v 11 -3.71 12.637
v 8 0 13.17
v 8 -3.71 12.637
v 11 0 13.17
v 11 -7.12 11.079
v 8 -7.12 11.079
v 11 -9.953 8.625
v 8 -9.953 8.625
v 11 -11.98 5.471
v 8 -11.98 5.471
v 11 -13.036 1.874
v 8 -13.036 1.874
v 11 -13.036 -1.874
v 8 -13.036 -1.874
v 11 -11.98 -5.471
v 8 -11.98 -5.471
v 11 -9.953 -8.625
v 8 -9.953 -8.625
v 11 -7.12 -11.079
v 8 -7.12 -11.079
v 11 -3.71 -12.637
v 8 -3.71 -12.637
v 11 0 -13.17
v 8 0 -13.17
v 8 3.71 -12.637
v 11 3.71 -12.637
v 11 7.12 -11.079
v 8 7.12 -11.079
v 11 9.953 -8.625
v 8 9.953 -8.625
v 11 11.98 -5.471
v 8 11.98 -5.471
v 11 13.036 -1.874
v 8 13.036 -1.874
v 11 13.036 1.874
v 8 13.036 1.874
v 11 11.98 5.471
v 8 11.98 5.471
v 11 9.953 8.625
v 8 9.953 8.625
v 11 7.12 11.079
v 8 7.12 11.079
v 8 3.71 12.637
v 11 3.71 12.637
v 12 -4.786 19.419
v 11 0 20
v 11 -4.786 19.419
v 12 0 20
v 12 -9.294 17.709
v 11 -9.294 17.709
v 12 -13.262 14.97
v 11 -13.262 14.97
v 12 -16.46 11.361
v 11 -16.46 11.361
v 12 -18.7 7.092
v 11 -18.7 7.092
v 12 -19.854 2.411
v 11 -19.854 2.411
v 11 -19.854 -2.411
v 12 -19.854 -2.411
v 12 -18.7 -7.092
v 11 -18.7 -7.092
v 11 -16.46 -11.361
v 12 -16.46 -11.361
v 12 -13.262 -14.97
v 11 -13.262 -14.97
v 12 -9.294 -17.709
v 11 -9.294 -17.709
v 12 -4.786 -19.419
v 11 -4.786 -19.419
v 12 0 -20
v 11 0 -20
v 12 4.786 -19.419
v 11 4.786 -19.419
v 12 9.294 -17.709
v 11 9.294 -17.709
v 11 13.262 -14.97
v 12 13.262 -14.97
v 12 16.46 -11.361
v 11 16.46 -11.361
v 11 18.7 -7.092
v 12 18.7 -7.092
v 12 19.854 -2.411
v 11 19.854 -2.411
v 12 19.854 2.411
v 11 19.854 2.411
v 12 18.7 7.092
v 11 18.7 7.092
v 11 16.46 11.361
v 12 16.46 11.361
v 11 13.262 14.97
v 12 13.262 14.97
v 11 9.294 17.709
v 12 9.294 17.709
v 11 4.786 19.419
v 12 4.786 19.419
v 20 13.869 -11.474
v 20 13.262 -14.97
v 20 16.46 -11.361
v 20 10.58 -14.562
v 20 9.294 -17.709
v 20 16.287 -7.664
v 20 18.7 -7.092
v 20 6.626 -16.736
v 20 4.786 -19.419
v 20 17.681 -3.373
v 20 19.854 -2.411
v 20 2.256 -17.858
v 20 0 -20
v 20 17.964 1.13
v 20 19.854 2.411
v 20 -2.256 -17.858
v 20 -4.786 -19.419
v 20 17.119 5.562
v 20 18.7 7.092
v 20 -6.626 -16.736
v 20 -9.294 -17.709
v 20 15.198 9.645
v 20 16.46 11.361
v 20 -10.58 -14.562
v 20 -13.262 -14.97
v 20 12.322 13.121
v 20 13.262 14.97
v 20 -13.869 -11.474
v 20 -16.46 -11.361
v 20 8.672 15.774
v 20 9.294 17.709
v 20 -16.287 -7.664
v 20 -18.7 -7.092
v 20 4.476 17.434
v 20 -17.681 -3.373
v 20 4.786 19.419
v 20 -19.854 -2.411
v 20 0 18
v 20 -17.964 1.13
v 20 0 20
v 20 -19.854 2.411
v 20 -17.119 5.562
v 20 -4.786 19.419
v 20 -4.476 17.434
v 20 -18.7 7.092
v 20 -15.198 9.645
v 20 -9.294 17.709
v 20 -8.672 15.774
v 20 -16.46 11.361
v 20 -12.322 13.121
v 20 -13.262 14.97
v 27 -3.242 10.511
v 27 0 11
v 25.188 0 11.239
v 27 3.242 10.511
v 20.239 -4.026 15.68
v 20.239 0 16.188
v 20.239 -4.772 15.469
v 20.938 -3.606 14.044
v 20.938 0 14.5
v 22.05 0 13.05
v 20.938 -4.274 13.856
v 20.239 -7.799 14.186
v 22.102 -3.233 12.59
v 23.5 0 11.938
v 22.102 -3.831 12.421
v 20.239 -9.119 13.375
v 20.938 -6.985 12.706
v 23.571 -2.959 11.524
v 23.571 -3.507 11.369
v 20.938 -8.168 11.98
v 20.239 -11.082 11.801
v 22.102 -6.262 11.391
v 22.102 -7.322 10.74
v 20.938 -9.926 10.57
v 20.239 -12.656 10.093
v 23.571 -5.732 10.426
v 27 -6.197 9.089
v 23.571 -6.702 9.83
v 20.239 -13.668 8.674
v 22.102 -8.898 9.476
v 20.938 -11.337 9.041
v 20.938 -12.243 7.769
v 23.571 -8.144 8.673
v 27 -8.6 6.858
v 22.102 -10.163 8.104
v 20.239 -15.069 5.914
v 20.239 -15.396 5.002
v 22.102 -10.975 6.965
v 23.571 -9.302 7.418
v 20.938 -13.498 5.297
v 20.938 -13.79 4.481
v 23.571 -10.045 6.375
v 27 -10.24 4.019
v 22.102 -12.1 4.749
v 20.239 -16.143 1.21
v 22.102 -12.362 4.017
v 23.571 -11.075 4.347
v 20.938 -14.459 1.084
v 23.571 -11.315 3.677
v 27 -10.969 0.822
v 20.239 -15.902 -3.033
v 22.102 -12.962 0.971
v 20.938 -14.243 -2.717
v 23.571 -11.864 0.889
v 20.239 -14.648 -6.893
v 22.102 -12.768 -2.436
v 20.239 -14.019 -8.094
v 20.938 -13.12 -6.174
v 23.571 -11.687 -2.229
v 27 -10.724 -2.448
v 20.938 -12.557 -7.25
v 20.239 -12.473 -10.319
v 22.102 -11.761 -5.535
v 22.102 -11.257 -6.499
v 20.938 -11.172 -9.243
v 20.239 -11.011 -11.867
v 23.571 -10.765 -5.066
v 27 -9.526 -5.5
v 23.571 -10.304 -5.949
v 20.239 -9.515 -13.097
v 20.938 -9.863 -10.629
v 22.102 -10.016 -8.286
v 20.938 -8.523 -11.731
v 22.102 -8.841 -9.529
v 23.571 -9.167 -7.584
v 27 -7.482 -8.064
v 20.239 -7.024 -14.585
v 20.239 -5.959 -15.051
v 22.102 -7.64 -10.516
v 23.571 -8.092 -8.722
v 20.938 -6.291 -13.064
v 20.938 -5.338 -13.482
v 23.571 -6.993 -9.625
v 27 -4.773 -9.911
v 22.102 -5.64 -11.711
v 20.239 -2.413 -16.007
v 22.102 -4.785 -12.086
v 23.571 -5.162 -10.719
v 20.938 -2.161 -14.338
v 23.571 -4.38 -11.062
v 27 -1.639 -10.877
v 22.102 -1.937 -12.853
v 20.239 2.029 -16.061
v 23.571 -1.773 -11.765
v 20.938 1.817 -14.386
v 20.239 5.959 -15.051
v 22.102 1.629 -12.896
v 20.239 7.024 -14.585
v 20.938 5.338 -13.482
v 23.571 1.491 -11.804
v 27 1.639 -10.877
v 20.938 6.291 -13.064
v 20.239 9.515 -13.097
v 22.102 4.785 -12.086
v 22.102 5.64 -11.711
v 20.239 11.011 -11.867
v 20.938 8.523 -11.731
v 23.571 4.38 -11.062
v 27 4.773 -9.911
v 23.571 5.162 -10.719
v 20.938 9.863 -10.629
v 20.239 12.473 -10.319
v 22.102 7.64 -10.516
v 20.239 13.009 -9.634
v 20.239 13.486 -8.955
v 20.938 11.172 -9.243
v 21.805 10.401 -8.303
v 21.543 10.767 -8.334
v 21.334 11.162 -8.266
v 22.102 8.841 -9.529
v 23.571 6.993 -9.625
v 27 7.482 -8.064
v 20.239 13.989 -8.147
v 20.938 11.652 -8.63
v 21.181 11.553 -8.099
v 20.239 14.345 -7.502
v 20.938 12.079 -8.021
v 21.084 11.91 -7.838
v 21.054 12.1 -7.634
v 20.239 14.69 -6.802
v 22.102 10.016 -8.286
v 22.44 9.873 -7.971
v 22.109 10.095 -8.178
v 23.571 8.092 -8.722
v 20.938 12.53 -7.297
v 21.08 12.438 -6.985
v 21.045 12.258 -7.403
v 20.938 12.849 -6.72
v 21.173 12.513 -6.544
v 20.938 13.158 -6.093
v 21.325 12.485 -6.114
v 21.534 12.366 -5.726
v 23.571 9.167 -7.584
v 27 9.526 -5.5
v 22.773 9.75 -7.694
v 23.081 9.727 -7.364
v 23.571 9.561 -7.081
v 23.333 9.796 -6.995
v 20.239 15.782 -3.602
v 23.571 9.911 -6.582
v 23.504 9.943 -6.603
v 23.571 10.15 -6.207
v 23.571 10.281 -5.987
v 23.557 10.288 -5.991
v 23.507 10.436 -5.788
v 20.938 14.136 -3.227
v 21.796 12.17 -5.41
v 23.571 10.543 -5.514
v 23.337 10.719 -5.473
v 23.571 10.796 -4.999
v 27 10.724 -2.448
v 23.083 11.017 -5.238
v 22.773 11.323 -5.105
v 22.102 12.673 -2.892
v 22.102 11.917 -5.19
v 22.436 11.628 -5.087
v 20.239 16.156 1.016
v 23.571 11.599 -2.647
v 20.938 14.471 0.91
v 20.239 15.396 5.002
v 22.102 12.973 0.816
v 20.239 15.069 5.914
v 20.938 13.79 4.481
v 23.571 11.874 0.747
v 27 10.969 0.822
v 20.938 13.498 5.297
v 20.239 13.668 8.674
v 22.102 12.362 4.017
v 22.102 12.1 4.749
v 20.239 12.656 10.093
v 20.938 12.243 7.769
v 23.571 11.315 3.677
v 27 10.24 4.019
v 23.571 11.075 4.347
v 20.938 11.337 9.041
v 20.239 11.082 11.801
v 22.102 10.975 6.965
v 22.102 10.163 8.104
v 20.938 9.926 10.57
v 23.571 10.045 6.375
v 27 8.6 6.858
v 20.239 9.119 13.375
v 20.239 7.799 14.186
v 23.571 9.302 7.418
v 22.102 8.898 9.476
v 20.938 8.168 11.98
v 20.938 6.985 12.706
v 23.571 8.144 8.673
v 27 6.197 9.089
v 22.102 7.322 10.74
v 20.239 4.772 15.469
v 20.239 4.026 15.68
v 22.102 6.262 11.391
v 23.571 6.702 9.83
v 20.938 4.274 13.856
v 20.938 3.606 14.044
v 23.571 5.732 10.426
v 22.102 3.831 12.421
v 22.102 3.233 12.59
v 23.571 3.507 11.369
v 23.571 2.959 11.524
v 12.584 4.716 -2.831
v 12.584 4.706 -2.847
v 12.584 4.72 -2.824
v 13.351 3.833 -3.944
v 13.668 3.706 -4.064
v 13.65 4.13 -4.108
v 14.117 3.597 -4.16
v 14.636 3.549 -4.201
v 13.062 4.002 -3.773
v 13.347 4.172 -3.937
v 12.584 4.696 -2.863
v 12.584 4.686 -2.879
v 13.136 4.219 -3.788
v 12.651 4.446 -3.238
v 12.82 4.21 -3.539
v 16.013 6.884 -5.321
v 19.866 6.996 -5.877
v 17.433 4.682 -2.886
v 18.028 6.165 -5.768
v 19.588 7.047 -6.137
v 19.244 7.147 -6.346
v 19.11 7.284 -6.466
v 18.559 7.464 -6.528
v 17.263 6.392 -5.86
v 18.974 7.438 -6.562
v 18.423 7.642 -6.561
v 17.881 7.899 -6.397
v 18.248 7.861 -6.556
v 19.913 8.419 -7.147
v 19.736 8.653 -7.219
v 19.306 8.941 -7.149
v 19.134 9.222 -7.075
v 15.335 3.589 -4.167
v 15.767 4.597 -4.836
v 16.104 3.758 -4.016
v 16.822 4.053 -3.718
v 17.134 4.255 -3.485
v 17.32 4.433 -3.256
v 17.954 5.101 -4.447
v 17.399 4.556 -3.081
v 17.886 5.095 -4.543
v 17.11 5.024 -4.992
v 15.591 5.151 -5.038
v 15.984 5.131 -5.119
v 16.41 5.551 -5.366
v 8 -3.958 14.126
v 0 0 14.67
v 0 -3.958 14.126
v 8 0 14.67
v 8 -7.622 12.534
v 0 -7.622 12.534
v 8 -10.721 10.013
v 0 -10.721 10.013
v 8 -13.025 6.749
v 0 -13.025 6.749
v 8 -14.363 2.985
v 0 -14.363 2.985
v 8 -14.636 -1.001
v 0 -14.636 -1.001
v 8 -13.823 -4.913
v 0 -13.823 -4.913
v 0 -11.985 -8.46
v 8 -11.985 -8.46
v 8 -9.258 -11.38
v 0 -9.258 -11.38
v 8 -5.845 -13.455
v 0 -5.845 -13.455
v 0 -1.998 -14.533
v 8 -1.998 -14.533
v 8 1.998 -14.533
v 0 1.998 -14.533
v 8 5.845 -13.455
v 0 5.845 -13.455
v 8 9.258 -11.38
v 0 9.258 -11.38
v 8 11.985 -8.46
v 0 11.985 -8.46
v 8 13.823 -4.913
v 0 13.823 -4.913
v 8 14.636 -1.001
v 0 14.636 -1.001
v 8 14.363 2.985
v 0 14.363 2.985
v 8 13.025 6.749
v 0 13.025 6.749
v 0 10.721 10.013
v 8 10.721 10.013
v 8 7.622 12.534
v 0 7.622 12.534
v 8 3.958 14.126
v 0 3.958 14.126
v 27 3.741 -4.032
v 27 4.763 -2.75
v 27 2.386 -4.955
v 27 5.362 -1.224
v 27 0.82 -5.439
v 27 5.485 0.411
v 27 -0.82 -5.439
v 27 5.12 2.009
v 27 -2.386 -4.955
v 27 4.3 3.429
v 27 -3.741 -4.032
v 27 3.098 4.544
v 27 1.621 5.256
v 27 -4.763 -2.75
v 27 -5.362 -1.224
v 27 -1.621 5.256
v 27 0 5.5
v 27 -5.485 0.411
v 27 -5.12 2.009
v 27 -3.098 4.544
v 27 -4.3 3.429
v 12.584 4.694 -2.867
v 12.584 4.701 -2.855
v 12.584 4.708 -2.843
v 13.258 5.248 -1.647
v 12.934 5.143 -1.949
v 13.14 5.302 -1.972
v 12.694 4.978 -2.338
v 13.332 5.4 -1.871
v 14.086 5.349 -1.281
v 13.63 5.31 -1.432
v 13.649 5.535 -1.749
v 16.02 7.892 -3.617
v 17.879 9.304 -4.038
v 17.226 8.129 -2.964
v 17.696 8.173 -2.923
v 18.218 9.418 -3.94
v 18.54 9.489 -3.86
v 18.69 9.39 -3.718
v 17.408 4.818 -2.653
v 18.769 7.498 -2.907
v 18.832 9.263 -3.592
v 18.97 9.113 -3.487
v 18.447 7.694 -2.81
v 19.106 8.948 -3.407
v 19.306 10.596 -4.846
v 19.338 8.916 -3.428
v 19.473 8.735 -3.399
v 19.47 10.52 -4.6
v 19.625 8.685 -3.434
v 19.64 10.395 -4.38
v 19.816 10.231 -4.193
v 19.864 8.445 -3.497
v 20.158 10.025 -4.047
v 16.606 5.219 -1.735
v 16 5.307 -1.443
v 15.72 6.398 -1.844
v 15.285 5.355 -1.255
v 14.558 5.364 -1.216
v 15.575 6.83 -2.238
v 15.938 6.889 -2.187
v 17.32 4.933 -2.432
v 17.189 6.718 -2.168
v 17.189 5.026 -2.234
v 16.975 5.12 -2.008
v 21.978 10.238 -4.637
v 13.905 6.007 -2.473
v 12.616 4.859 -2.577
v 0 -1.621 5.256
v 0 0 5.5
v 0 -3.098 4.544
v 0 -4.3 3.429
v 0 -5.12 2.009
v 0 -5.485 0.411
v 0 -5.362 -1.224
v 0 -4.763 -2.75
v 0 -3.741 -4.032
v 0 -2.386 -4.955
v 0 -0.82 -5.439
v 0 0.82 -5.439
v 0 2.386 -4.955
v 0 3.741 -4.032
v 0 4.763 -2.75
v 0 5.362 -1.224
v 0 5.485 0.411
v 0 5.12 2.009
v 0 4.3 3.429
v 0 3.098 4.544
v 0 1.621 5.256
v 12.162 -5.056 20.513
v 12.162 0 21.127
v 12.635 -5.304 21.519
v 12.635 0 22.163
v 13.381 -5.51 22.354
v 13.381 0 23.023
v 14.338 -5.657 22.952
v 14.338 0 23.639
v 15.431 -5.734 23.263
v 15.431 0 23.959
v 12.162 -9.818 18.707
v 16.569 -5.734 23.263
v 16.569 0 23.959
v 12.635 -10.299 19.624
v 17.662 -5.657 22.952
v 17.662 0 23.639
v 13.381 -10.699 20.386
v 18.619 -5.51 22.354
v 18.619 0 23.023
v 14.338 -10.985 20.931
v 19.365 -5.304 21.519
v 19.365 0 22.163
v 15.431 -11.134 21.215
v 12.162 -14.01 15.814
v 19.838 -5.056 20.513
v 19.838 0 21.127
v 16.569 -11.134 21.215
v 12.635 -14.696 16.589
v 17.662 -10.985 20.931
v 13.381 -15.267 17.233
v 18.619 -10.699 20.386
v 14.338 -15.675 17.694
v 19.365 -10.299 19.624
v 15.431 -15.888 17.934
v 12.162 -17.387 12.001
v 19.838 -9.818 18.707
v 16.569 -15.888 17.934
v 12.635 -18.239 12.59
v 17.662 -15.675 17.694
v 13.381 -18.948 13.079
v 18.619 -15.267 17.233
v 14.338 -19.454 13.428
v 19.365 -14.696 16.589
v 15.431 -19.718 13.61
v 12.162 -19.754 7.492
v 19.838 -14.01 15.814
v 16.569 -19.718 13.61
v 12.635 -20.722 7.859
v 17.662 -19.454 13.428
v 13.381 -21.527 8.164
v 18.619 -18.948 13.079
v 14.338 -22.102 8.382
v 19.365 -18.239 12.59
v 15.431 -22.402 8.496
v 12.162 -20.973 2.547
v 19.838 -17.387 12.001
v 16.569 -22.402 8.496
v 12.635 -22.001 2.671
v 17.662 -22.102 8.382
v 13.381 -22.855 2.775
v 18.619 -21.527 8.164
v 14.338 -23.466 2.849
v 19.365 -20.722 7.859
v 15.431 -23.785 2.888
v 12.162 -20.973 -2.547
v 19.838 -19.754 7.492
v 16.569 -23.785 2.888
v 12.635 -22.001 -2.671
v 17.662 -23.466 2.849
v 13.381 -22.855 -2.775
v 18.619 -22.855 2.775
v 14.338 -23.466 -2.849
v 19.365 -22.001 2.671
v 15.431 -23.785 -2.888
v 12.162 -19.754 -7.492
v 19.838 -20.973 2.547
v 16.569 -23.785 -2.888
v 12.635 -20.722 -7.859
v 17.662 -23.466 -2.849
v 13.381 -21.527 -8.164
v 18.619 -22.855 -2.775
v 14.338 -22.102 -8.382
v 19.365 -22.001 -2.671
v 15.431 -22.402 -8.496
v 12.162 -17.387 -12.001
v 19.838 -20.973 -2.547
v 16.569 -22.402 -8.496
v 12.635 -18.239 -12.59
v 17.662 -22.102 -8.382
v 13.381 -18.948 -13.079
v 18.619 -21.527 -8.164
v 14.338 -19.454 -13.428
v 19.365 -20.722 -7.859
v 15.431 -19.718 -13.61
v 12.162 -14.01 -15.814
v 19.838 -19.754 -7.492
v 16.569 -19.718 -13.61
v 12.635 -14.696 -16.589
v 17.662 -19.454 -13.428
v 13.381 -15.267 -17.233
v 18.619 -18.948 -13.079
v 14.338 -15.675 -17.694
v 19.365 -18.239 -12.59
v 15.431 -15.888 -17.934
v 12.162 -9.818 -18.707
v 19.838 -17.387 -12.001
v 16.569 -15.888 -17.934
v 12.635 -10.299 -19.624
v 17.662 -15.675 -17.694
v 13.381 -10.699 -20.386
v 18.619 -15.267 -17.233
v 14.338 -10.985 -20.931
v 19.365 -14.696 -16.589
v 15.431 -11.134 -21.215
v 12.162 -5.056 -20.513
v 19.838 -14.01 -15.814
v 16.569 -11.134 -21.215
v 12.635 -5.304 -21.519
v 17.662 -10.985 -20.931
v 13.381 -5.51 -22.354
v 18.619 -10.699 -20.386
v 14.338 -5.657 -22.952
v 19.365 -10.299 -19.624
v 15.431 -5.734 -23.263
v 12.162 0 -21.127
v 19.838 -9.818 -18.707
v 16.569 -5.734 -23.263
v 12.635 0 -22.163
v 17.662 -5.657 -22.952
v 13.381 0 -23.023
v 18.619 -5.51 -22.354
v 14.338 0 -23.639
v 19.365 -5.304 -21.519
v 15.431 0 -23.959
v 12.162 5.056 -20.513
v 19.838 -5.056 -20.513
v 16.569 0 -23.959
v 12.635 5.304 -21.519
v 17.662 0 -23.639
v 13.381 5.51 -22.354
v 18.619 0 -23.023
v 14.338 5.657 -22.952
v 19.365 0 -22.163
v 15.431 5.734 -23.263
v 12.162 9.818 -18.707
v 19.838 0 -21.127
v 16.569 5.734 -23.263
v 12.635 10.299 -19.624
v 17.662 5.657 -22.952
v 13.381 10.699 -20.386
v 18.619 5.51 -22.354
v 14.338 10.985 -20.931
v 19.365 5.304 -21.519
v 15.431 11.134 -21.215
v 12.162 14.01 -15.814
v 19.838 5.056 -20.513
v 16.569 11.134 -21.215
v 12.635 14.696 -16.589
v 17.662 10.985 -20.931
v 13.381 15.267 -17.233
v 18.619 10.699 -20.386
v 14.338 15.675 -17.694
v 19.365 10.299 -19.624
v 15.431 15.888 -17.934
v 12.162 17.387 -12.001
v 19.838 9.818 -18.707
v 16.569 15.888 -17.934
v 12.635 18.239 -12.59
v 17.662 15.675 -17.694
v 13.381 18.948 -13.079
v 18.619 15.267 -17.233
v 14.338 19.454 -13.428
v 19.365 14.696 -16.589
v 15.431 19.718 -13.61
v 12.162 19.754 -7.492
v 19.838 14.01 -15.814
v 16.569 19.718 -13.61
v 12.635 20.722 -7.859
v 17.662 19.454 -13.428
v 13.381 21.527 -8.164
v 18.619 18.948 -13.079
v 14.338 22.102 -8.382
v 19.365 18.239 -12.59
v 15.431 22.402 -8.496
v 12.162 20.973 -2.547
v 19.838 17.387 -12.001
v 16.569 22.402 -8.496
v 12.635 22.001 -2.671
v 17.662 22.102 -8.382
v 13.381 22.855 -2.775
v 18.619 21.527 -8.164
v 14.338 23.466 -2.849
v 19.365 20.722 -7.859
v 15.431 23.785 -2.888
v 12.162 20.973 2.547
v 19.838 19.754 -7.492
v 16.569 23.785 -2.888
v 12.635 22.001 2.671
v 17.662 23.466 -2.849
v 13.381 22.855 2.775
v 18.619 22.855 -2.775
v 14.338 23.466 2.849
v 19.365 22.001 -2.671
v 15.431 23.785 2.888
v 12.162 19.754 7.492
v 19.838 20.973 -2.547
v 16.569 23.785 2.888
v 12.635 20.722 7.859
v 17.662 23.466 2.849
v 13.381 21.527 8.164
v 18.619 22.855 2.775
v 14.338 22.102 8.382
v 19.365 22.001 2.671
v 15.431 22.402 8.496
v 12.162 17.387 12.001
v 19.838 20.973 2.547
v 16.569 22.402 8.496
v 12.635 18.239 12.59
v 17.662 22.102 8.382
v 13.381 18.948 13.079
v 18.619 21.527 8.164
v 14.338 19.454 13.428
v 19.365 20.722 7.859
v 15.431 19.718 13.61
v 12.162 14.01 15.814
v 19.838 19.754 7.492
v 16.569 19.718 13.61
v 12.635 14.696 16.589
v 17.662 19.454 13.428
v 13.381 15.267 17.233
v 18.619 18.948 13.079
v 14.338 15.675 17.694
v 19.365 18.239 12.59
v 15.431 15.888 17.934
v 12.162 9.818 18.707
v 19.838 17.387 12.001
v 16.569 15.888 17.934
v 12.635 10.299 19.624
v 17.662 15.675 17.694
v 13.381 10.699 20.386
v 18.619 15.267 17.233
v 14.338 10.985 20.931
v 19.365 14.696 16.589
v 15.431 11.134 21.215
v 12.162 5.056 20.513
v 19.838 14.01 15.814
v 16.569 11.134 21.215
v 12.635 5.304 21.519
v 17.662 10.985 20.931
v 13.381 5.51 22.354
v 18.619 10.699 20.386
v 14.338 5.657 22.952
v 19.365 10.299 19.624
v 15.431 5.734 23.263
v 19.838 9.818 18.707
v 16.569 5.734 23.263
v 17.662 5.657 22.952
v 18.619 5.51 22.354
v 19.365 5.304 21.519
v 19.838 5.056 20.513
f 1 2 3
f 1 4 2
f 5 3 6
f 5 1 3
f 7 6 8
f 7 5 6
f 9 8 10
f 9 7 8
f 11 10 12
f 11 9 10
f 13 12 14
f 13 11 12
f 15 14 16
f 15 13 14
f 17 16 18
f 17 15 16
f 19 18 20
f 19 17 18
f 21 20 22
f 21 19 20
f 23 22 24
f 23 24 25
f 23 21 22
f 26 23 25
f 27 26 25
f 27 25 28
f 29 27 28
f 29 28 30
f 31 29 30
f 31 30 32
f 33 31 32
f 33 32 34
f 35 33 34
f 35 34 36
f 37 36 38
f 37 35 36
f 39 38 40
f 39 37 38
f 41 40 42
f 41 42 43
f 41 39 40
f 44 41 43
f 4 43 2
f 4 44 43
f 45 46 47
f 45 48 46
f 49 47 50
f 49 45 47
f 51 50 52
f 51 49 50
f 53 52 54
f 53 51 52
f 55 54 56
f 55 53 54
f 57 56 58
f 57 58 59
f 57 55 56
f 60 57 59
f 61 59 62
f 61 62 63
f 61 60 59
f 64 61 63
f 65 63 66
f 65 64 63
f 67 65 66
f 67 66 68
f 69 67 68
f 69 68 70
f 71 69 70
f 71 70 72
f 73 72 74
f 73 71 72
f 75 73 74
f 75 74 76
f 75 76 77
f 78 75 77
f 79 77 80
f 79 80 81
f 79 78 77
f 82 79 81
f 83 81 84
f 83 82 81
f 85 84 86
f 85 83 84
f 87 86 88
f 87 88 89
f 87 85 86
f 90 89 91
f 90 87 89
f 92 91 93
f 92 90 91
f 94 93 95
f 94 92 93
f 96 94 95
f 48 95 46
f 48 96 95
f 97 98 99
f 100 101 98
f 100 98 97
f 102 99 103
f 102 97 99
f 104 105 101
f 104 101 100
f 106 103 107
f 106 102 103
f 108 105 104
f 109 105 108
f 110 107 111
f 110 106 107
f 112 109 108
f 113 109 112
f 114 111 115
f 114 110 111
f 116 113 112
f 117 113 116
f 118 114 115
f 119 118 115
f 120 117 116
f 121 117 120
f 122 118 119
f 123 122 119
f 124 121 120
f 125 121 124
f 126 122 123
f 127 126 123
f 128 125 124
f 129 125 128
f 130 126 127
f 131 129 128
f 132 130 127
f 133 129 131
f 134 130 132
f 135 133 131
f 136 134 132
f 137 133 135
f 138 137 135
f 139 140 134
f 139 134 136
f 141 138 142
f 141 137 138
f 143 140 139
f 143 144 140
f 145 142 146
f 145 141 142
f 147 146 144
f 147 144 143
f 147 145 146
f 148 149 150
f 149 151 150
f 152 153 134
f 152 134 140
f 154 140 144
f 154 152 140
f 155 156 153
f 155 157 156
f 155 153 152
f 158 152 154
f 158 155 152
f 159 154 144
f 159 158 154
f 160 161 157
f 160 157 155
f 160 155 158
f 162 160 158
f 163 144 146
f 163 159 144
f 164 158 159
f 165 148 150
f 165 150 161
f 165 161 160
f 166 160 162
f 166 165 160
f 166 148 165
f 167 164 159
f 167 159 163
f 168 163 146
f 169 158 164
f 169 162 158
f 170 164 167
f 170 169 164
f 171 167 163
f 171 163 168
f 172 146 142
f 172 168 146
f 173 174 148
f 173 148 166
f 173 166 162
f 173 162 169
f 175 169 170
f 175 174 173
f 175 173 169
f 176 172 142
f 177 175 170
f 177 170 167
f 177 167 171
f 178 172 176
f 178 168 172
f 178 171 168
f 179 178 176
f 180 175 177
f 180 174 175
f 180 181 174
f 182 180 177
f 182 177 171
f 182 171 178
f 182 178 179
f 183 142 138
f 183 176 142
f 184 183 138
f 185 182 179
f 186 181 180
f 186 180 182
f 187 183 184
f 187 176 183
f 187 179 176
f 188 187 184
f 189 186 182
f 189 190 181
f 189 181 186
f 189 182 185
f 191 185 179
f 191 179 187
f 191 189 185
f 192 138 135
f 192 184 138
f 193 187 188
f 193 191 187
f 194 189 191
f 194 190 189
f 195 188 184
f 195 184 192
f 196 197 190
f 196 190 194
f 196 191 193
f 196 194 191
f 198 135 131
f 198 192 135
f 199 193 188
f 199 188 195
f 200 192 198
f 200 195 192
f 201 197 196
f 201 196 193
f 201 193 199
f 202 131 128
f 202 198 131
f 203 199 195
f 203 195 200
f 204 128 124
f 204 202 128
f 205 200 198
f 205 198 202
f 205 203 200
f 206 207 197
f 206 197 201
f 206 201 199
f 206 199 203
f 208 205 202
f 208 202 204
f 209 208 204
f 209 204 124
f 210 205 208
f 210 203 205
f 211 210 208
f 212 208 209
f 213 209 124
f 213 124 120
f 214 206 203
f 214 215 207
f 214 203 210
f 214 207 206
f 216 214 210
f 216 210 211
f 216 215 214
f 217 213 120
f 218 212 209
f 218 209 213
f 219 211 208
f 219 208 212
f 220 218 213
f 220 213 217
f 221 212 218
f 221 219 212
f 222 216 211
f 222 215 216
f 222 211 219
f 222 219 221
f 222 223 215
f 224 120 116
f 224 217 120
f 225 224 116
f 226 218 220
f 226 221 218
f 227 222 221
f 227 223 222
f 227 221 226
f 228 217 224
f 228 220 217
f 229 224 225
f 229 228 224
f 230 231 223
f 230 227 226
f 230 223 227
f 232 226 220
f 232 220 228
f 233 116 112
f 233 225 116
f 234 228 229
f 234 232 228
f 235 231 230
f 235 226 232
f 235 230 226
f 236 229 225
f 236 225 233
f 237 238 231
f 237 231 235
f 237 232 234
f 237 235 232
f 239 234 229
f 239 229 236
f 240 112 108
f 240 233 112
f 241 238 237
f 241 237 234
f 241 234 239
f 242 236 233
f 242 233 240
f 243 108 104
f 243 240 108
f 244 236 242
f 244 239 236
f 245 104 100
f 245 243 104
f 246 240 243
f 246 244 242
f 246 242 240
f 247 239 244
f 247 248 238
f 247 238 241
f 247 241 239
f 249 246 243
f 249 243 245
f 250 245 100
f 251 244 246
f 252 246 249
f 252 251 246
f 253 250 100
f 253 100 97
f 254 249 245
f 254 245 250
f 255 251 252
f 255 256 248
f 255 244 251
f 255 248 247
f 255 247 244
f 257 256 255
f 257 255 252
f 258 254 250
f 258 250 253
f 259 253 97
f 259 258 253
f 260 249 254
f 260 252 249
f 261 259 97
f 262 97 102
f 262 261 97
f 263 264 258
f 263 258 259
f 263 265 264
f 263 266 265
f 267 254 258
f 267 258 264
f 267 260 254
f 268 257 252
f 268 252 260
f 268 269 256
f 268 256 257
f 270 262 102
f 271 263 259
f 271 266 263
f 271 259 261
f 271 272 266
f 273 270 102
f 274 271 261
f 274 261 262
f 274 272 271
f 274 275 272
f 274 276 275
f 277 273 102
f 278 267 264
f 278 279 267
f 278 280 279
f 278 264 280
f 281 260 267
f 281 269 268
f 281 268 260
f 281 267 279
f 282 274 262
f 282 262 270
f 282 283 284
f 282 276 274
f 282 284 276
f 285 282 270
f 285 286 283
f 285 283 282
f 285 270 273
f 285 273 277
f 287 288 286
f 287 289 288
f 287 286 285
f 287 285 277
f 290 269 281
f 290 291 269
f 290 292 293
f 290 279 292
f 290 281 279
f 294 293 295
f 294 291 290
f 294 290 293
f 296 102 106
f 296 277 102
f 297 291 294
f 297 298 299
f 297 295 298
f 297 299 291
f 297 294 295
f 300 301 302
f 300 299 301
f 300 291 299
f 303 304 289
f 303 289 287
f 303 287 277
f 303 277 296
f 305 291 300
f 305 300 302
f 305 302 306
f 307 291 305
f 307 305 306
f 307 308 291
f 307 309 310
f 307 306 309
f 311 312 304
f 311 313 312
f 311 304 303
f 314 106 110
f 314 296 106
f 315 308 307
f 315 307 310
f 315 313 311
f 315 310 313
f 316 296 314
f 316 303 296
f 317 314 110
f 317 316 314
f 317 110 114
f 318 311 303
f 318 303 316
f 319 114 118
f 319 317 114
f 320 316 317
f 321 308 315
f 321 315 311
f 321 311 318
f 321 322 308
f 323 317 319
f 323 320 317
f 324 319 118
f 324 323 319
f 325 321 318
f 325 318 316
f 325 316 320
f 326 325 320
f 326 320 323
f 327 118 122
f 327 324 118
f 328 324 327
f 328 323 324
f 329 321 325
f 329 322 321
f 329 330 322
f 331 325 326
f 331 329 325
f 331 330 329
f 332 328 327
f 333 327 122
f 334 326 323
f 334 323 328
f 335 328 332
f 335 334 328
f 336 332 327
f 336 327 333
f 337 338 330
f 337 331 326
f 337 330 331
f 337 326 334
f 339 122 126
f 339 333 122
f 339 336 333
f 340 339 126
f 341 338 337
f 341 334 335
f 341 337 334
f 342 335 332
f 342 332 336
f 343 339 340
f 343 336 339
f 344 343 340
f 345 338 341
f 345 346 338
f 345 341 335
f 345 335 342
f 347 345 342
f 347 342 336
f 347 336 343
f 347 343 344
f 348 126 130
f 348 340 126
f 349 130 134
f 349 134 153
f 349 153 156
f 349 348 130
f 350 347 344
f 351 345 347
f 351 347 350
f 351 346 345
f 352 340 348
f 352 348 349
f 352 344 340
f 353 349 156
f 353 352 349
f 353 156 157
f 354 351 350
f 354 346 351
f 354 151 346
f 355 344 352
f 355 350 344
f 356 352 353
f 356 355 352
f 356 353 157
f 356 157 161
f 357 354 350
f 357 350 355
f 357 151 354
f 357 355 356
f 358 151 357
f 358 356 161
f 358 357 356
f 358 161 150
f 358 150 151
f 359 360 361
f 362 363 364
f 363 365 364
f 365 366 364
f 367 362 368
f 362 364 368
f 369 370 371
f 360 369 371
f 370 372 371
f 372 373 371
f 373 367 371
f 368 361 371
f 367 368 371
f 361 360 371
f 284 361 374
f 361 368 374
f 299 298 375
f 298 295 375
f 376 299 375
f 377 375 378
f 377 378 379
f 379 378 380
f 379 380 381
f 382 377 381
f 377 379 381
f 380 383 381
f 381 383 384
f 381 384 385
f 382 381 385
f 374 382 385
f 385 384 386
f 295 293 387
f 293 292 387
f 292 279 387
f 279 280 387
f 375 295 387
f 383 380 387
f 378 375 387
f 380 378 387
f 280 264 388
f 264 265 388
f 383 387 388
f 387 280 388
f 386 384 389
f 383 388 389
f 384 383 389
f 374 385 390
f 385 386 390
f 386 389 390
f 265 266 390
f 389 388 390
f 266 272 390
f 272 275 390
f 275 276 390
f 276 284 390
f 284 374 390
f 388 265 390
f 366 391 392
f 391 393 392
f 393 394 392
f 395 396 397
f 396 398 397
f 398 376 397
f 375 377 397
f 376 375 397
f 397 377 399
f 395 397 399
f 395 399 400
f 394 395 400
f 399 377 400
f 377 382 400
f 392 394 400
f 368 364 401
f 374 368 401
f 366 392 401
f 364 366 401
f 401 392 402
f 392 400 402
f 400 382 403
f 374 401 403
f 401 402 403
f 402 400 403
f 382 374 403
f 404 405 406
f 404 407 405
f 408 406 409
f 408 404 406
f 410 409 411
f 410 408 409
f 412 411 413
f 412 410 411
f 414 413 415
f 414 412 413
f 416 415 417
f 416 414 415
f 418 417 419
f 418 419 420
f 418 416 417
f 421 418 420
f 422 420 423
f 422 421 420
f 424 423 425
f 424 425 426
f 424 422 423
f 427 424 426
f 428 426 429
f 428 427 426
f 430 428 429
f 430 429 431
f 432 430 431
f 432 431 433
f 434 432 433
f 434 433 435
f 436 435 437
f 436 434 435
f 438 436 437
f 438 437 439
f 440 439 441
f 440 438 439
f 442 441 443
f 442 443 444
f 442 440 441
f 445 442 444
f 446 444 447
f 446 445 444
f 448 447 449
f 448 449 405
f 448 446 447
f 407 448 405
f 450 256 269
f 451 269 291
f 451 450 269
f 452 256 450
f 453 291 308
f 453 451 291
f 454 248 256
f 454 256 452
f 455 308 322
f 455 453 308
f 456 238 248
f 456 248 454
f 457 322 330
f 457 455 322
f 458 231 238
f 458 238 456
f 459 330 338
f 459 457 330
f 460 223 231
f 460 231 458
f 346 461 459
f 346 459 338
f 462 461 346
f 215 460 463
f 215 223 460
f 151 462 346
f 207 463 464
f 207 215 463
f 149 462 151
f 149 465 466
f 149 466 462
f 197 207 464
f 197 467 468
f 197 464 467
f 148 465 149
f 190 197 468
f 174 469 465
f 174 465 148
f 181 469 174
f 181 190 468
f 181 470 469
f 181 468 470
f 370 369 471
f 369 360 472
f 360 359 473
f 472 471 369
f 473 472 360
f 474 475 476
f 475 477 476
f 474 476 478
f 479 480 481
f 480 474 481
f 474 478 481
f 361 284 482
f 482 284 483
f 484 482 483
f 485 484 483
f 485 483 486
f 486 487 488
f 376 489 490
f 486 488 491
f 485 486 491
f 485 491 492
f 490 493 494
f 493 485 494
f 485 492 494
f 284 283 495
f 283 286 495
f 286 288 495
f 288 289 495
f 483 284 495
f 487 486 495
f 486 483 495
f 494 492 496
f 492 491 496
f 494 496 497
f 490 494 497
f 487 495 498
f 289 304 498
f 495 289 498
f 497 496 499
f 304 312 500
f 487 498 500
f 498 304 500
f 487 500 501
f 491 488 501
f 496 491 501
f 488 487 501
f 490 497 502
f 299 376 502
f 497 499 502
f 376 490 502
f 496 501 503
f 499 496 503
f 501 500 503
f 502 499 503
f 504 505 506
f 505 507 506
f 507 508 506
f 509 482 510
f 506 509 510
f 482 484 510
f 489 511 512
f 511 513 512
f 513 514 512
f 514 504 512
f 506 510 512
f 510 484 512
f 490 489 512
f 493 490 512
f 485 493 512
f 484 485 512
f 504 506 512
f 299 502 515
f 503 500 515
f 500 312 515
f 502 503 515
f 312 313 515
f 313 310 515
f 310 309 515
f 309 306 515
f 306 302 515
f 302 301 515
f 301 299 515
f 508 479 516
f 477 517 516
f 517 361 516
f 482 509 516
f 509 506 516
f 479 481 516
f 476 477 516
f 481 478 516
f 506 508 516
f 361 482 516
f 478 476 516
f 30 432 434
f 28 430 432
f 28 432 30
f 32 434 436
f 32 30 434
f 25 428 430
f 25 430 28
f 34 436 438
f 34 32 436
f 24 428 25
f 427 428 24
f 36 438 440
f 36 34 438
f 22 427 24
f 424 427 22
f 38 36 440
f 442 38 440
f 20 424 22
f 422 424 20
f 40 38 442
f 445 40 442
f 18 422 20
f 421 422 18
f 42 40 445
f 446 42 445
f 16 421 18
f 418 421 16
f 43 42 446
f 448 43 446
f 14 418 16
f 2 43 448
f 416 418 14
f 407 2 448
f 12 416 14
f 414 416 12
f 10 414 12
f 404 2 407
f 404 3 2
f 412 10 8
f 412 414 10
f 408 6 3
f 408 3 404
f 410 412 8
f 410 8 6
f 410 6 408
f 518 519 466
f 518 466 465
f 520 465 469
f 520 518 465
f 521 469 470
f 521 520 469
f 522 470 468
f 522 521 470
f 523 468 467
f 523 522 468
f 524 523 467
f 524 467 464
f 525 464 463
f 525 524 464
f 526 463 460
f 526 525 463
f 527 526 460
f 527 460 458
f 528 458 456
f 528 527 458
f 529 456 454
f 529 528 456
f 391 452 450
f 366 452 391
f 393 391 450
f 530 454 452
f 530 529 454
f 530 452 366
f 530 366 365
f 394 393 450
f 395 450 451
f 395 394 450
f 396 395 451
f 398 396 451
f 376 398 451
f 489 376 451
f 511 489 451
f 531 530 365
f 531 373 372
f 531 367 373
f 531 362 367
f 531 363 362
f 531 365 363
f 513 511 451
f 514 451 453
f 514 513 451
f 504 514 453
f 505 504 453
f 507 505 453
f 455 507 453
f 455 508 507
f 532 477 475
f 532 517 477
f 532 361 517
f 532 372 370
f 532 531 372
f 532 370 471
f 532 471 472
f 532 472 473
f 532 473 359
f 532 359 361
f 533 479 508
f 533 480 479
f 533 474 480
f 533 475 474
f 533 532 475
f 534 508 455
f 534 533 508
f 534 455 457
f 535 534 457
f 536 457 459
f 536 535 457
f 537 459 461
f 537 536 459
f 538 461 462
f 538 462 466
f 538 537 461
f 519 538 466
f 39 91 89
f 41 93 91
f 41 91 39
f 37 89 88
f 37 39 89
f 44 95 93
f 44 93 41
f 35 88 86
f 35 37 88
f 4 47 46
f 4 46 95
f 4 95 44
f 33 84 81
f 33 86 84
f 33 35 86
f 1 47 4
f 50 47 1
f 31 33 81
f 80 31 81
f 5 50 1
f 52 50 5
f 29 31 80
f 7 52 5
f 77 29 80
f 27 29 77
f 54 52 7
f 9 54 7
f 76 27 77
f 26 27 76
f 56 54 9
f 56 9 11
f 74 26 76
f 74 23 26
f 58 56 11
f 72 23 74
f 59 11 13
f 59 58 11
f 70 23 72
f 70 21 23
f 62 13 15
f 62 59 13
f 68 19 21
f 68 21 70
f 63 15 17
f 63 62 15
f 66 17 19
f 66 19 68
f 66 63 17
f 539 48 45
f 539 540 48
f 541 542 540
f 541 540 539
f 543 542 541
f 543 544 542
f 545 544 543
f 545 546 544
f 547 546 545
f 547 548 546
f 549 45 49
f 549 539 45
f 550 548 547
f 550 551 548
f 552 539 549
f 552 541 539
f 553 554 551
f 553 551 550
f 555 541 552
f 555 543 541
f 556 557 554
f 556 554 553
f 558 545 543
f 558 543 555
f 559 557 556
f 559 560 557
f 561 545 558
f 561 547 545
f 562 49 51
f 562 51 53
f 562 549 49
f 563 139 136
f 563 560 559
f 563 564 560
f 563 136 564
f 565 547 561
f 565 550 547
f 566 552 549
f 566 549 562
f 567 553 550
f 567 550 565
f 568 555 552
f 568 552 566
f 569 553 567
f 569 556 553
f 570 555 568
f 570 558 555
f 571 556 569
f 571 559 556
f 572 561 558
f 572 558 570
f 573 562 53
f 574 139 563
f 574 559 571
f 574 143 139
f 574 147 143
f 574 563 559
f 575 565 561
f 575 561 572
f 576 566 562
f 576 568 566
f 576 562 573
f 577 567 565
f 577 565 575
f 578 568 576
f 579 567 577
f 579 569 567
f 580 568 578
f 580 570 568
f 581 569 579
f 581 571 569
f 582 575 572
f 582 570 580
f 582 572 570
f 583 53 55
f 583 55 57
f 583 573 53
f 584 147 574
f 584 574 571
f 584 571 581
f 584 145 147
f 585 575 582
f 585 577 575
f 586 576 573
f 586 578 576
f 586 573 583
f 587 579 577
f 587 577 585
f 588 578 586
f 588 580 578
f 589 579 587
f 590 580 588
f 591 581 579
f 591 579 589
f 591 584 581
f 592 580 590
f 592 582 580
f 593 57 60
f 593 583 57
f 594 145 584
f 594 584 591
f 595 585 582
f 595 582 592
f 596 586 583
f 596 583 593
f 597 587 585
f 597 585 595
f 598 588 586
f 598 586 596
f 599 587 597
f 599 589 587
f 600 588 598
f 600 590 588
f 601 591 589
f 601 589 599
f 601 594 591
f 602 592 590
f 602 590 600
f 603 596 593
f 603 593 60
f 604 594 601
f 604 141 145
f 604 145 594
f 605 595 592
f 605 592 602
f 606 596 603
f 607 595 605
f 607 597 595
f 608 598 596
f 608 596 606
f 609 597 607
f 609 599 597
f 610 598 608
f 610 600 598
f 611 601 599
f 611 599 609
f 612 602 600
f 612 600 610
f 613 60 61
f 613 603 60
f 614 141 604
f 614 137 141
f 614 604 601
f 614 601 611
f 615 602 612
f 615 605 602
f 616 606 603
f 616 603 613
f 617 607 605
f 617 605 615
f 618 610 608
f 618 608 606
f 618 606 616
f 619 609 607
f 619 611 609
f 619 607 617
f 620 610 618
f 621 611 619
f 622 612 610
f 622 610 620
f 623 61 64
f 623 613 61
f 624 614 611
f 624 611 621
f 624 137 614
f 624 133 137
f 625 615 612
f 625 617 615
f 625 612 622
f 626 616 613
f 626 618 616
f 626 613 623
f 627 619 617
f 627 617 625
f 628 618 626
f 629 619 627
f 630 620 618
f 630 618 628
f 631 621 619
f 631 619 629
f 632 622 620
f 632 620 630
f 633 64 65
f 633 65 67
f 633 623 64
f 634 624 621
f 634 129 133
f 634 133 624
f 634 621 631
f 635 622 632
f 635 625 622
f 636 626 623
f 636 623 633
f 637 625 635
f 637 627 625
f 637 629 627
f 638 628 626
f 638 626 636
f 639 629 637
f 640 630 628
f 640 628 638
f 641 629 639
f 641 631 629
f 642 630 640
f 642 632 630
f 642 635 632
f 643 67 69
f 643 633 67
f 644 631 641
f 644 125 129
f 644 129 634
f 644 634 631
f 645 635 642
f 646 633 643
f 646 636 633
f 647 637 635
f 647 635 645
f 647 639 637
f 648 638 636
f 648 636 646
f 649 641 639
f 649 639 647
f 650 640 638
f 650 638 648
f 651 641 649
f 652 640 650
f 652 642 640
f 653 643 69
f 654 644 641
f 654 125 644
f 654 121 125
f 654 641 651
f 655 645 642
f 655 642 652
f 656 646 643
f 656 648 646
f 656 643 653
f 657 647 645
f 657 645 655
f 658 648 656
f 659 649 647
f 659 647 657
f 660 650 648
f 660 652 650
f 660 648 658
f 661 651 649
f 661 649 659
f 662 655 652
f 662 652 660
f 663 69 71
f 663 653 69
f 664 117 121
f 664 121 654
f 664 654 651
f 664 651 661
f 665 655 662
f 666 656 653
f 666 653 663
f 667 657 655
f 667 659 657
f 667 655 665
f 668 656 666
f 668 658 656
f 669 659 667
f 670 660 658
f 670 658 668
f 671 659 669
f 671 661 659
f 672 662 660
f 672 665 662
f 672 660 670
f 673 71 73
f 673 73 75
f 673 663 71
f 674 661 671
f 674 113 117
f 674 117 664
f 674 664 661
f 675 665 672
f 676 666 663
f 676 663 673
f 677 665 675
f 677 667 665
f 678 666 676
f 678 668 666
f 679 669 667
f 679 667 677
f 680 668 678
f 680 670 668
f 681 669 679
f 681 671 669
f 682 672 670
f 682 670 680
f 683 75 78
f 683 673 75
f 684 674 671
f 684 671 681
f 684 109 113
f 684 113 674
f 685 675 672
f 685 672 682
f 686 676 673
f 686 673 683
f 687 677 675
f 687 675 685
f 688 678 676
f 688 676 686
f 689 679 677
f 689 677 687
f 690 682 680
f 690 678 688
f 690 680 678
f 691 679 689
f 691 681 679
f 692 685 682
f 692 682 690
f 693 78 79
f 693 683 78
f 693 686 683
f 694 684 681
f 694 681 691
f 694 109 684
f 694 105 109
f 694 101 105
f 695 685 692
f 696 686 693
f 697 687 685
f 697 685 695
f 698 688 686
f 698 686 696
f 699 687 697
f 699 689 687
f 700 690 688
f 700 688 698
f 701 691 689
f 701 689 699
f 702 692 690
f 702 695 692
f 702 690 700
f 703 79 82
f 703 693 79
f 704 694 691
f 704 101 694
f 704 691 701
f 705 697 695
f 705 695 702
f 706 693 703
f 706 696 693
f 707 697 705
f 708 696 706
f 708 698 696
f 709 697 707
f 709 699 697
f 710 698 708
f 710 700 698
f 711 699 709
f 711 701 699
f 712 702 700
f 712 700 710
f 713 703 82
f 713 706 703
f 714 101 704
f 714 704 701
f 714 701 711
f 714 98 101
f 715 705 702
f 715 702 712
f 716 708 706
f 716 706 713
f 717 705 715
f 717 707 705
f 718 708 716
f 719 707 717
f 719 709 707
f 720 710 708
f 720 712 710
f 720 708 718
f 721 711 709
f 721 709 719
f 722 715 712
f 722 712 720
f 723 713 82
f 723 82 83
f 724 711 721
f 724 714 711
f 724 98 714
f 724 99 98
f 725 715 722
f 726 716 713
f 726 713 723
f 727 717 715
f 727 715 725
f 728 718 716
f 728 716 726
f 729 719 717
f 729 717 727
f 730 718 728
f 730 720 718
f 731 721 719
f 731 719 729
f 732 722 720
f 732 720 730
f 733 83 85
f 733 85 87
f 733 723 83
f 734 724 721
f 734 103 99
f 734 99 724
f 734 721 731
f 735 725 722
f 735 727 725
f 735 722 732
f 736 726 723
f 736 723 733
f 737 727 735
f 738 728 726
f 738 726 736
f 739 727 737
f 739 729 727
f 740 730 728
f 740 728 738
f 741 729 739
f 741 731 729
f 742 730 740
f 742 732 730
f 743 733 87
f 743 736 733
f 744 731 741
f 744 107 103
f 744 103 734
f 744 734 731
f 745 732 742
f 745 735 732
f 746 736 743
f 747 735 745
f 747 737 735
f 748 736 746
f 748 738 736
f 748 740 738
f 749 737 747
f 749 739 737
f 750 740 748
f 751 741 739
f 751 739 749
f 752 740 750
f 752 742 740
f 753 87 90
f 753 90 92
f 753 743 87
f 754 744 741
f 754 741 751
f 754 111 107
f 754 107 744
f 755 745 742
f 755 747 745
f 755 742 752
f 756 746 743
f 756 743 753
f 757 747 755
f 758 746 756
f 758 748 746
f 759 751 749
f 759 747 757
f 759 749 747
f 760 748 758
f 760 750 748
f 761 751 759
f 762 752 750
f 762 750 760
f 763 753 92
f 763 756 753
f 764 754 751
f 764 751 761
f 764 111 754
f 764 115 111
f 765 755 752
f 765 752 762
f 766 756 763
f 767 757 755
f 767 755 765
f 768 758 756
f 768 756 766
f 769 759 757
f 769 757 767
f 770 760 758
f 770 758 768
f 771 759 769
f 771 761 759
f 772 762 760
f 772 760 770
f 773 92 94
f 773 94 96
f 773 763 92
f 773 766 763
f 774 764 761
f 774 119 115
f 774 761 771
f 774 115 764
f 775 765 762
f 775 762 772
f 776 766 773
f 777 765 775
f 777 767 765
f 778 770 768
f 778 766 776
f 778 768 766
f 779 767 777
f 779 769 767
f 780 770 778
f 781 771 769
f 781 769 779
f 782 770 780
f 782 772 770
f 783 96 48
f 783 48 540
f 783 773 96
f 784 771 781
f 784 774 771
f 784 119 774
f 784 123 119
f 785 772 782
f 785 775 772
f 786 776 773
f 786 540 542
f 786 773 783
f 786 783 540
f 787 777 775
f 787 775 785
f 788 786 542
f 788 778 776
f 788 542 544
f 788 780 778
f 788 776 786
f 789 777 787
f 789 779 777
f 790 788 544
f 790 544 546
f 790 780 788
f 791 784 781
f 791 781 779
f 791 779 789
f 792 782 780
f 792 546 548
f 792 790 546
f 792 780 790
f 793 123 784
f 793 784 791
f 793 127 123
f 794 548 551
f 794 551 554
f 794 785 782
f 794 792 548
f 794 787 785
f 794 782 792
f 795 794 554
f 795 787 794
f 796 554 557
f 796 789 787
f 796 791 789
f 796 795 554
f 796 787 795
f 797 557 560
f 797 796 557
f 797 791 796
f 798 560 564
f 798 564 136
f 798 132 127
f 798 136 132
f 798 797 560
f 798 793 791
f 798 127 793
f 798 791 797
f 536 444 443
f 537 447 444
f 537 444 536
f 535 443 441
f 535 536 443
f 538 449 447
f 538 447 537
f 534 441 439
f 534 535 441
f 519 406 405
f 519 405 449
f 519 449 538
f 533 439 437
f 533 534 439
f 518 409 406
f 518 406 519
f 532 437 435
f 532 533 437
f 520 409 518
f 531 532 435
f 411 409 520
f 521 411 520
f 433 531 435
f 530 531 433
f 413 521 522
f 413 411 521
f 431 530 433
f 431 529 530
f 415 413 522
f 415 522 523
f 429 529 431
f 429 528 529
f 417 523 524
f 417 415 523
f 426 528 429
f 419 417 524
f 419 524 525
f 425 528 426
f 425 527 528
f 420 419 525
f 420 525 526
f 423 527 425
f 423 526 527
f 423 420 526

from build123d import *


with BuildPart() as part:
    # Sketch1 → Revolve1 (revolve)
    with BuildSketch(Plane.XY, mode=Mode.PRIVATE) as revolve1_sk:
        with BuildLine():
            Line((0, 5.5), (0, 14.67))
            Line((0, 14.67), (8, 14.67))
            Line((8, 14.67), (8, 13.17))
            Line((8, 13.17), (11, 13.17))
            Line((11, 13.17), (11, 20))
            Line((11, 20), (12, 20))
            ThreePointArc((12, 20), (16, 24), (20, 20))
            Line((20, 20), (20, 18))
            ThreePointArc((20, 18), (22.050252532, 13.050252532), (27, 11))
            Line((27, 11), (27, 5.5))
            Line((27, 5.5), (0, 5.5))
        make_face()
    revolve(revolve1_sk.sketch.rotate(Axis((0, 0, 0), (1, 0, 0)), 90), axis=Axis((0, 0, 0), (1, 0, 0)))

    # Ø3.5 (3.5) Diameter Hole2: read off the stored shape, not the designer's step
    # Ø3.5 (3.5) Diameter Hole2: loft between two sections, ruled curve by curve
    f_3_5_3_5_diameter_hole2_from = [
        Edge.make_three_point_arc((12.584394195, 4.719603739, -2.823958877), (13.87319466, 4.552306942, -0.717776277), (15.109619522, 2.611483824, -1.628522776)),
        Edge.make_three_point_arc((15.109619522, 2.611483824, -1.628522776), (13.820819057, 2.778780621, -3.734705376), (12.584394195, 4.719603739, -2.823958877)),
    ]
    f_3_5_3_5_diameter_hole2_to = [
        Edge.make_three_point_arc((21.045529414, 12.258443907, -7.402617534), (22.334329879, 12.09114711, -5.296434934), (23.570754741, 10.150323992, -6.207181432)),
        Edge.make_three_point_arc((23.570754741, 10.150323992, -6.207181432), (22.281954276, 10.317620789, -8.313364032), (21.045529414, 12.258443907, -7.402617534)),
    ]
    f_3_5_3_5_diameter_hole2 = Solid(Shell([*[Face.make_surface_from_curves(f_3_5_3_5_diameter_hole2_from[k], f_3_5_3_5_diameter_hole2_to[k]) for k in range(2)], Face(Wire(f_3_5_3_5_diameter_hole2_from)), Face(Wire(f_3_5_3_5_diameter_hole2_to))]))
    add(f_3_5_3_5_diameter_hole2, mode=Mode.SUBTRACT)


solid = part.part
